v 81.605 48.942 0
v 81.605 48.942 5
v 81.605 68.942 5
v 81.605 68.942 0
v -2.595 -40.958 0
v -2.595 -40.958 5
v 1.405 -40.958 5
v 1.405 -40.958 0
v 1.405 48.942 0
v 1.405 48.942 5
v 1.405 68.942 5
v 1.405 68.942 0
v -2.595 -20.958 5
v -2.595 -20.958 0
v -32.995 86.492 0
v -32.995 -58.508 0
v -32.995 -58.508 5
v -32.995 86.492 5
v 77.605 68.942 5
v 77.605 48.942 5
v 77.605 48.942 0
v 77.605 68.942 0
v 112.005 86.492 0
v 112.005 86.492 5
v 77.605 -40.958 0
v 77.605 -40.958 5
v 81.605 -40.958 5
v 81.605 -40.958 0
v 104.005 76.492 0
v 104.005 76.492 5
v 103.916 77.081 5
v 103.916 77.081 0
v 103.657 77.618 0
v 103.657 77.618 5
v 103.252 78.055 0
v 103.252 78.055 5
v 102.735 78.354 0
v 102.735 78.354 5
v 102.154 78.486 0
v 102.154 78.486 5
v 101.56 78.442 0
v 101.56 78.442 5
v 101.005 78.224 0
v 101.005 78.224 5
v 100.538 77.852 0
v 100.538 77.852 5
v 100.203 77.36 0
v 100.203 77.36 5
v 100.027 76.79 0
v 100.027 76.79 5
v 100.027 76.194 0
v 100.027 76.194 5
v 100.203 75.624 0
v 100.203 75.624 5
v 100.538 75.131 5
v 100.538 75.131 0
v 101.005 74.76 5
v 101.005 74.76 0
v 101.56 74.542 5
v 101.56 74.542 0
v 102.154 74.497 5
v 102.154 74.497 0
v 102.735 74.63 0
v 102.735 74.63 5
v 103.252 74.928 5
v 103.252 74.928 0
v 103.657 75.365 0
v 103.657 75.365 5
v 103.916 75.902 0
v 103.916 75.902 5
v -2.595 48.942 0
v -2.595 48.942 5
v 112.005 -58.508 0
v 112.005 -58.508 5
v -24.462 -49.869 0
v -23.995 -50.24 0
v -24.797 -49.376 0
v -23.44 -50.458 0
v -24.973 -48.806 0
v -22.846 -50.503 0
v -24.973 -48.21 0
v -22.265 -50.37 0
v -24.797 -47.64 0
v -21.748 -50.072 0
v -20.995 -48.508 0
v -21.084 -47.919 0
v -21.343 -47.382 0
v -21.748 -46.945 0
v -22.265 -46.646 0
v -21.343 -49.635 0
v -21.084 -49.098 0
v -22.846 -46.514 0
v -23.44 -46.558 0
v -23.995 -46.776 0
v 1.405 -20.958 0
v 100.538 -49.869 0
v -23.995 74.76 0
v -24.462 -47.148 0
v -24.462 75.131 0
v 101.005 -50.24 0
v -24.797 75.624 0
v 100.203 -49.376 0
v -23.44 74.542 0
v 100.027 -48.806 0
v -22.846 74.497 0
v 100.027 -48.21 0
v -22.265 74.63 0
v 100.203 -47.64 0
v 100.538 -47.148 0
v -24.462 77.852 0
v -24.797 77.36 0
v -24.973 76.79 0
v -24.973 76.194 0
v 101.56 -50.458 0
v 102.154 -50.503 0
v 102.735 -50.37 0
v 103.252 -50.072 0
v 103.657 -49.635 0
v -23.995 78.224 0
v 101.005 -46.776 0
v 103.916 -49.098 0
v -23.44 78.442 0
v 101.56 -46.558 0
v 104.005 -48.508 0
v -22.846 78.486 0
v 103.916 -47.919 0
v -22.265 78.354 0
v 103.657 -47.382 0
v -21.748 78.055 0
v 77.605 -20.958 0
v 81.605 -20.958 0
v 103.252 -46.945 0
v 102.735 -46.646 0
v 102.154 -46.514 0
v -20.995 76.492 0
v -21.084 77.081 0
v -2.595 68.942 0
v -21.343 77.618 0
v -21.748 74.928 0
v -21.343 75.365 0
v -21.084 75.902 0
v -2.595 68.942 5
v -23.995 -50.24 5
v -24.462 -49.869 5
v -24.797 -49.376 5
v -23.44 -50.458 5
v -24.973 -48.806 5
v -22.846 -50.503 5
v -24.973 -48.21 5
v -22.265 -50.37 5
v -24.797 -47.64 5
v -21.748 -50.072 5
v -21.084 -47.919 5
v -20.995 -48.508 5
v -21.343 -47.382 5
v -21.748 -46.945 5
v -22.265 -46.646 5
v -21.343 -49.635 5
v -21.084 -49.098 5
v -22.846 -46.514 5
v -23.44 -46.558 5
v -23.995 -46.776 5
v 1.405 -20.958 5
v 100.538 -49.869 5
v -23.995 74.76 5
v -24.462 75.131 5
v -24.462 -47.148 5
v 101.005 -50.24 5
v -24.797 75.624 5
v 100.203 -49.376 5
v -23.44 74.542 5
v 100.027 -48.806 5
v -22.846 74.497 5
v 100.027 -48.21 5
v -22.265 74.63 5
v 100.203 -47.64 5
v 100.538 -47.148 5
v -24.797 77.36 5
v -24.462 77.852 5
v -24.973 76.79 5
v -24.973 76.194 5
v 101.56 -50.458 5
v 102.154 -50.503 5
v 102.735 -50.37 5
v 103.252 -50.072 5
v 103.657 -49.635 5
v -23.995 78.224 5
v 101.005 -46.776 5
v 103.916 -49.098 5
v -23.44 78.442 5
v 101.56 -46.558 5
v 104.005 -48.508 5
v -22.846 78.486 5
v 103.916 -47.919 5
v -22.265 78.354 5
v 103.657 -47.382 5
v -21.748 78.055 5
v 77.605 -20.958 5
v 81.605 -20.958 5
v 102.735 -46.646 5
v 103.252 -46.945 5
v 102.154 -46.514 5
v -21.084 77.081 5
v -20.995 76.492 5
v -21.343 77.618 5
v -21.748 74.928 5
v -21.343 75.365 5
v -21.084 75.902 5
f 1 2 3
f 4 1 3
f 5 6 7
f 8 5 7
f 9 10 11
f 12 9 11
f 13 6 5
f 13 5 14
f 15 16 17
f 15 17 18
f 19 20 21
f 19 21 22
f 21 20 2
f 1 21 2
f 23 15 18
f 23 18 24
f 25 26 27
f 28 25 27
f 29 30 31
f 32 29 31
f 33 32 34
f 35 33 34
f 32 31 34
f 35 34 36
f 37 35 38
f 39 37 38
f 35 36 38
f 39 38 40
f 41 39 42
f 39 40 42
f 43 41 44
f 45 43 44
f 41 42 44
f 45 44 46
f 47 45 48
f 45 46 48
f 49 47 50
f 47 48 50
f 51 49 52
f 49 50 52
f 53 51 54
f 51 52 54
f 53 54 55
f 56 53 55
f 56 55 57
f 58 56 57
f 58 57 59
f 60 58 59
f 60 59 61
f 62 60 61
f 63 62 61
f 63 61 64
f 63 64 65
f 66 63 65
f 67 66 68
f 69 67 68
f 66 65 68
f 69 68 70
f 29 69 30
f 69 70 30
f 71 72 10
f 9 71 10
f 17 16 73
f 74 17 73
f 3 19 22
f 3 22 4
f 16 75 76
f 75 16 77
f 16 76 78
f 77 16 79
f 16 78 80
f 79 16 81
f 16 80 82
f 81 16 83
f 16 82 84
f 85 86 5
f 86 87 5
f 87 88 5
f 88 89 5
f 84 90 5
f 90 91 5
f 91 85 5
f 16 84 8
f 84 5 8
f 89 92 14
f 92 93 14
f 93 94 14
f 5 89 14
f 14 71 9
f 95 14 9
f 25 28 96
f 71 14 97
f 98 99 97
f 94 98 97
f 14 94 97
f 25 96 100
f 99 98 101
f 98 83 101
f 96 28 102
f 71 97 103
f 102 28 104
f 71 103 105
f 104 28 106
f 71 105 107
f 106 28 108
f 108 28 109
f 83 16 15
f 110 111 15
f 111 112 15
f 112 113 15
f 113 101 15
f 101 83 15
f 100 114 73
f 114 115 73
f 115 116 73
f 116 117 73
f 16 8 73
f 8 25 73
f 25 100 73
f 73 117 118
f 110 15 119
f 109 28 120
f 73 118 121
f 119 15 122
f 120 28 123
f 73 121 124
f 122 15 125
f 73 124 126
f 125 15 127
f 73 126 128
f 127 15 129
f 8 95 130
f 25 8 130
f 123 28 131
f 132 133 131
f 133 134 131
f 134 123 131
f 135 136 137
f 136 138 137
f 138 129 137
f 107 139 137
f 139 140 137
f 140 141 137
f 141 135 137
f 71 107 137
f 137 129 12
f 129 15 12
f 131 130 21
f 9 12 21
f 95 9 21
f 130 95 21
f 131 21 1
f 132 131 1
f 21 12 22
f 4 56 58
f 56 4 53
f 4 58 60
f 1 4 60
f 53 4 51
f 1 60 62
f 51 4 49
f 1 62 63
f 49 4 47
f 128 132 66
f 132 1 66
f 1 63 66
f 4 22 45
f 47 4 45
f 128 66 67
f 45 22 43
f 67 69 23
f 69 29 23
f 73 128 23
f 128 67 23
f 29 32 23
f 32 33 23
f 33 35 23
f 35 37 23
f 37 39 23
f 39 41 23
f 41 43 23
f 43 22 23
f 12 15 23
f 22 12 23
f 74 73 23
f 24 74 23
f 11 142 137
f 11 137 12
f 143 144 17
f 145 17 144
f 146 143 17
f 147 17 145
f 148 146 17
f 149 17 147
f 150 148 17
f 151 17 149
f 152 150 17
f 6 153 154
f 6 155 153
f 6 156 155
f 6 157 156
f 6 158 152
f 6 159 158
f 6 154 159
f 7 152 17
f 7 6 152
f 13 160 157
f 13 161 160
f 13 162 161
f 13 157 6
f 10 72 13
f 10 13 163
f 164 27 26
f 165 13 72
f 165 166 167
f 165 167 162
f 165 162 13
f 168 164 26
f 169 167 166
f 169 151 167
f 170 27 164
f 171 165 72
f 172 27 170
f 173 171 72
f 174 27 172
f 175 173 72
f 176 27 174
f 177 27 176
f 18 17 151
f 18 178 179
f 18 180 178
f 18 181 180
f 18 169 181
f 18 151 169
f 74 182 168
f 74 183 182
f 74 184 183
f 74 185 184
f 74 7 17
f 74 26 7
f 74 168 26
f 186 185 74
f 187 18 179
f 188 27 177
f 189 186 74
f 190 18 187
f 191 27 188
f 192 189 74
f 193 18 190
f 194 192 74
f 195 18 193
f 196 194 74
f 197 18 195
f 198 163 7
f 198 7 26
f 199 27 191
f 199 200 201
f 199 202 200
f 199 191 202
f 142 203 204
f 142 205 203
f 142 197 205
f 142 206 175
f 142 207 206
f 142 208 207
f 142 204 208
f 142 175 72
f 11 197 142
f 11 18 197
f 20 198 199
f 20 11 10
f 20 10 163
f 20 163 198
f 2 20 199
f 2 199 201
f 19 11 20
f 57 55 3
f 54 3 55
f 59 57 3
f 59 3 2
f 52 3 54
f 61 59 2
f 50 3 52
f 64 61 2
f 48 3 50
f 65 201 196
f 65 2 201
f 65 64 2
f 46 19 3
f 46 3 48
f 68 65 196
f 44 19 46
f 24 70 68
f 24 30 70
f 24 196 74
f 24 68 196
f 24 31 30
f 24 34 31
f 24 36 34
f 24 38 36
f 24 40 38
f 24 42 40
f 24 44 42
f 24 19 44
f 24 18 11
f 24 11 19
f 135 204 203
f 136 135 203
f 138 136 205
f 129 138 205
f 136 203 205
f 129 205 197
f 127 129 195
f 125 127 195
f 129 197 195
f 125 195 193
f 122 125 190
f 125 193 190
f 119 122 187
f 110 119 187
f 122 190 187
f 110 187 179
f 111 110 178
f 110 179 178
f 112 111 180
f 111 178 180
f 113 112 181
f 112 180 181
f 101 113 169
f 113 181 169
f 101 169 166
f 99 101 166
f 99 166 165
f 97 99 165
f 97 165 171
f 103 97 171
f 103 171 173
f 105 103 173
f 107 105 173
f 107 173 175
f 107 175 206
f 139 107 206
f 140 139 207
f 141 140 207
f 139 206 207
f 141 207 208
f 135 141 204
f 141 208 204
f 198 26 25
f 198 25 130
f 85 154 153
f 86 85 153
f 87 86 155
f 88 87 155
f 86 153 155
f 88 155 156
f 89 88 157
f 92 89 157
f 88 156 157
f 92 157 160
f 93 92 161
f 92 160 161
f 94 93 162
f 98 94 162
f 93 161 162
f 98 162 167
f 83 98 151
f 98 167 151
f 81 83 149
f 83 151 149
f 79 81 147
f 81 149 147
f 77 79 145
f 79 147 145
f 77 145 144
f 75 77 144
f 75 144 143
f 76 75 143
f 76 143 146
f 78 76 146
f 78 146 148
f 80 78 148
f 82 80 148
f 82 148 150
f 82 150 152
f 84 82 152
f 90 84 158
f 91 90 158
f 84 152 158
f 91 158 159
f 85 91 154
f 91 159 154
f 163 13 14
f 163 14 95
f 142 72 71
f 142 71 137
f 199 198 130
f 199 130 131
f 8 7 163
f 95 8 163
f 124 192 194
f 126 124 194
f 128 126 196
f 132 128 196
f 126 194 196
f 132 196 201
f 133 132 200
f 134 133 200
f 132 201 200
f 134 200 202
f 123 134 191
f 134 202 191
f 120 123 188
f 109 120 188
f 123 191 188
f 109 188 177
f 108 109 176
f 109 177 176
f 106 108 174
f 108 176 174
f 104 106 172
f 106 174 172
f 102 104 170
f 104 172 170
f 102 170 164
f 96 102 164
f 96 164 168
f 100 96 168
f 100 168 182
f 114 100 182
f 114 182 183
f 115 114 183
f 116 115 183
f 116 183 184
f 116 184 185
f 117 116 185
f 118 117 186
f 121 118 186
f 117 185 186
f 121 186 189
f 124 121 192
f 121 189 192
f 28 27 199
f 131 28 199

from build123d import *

# Parameters (mm, degrees)
ESQUISSE1_W             = 145
ESQUISSE1_H             = 145
BOSS_EXTRU_1_DEPTH      = 5
ESQUISSE3_W             = 4
ESQUISSE3_H             = 20
ENL_V_MAT_EXTRU_1_DEPTH = 5
ESQUISSE2_R             = 2
ENL_V_MAT_EXTRU_2_DEPTH = 5


with BuildPart() as part:
    # Esquisse1 → Boss.-Extru.1 (new body)
    with BuildSketch(Plane.XY):
        with Locations((39.504598951, 13.991761527)):
            Rectangle(ESQUISSE1_W, ESQUISSE1_H)
    extrude(amount=BOSS_EXTRU_1_DEPTH)

    # Esquisse3 → Enlèv. mat.-Extru.1 (cut)
    with BuildSketch(Plane.XY.offset(5)):
        with Locations((79.604598951, 58.941761527)):
            Rectangle(ESQUISSE3_W, ESQUISSE3_H)
        with Locations((-0.595401049, 58.941761527)):
            Rectangle(ESQUISSE3_W, ESQUISSE3_H)
        with Locations((-0.595401049, -30.958238473)):
            Rectangle(ESQUISSE3_W, ESQUISSE3_H)
        with Locations((79.604598951, -30.958238473)):
            Rectangle(ESQUISSE3_W, ESQUISSE3_H)
    extrude(amount=-ENL_V_MAT_EXTRU_1_DEPTH, mode=Mode.SUBTRACT)

    # Esquisse2 → Enlèv. mat.-Extru.2 (cut)
    with BuildSketch(Plane.XY.offset(5)):
        with Locations((-22.995401049, 76.491761527)):
            Circle(ESQUISSE2_R)
        with Locations((102.004598951, 76.491761527)):
            Circle(ESQUISSE2_R)
        with Locations((102.004598951, -48.508238473)):
            Circle(ESQUISSE2_R)
        with Locations((-22.995401049, -48.508238473)):
            Circle(ESQUISSE2_R)
    extrude(amount=-ENL_V_MAT_EXTRU_2_DEPTH, mode=Mode.SUBTRACT)


solid = part.part
